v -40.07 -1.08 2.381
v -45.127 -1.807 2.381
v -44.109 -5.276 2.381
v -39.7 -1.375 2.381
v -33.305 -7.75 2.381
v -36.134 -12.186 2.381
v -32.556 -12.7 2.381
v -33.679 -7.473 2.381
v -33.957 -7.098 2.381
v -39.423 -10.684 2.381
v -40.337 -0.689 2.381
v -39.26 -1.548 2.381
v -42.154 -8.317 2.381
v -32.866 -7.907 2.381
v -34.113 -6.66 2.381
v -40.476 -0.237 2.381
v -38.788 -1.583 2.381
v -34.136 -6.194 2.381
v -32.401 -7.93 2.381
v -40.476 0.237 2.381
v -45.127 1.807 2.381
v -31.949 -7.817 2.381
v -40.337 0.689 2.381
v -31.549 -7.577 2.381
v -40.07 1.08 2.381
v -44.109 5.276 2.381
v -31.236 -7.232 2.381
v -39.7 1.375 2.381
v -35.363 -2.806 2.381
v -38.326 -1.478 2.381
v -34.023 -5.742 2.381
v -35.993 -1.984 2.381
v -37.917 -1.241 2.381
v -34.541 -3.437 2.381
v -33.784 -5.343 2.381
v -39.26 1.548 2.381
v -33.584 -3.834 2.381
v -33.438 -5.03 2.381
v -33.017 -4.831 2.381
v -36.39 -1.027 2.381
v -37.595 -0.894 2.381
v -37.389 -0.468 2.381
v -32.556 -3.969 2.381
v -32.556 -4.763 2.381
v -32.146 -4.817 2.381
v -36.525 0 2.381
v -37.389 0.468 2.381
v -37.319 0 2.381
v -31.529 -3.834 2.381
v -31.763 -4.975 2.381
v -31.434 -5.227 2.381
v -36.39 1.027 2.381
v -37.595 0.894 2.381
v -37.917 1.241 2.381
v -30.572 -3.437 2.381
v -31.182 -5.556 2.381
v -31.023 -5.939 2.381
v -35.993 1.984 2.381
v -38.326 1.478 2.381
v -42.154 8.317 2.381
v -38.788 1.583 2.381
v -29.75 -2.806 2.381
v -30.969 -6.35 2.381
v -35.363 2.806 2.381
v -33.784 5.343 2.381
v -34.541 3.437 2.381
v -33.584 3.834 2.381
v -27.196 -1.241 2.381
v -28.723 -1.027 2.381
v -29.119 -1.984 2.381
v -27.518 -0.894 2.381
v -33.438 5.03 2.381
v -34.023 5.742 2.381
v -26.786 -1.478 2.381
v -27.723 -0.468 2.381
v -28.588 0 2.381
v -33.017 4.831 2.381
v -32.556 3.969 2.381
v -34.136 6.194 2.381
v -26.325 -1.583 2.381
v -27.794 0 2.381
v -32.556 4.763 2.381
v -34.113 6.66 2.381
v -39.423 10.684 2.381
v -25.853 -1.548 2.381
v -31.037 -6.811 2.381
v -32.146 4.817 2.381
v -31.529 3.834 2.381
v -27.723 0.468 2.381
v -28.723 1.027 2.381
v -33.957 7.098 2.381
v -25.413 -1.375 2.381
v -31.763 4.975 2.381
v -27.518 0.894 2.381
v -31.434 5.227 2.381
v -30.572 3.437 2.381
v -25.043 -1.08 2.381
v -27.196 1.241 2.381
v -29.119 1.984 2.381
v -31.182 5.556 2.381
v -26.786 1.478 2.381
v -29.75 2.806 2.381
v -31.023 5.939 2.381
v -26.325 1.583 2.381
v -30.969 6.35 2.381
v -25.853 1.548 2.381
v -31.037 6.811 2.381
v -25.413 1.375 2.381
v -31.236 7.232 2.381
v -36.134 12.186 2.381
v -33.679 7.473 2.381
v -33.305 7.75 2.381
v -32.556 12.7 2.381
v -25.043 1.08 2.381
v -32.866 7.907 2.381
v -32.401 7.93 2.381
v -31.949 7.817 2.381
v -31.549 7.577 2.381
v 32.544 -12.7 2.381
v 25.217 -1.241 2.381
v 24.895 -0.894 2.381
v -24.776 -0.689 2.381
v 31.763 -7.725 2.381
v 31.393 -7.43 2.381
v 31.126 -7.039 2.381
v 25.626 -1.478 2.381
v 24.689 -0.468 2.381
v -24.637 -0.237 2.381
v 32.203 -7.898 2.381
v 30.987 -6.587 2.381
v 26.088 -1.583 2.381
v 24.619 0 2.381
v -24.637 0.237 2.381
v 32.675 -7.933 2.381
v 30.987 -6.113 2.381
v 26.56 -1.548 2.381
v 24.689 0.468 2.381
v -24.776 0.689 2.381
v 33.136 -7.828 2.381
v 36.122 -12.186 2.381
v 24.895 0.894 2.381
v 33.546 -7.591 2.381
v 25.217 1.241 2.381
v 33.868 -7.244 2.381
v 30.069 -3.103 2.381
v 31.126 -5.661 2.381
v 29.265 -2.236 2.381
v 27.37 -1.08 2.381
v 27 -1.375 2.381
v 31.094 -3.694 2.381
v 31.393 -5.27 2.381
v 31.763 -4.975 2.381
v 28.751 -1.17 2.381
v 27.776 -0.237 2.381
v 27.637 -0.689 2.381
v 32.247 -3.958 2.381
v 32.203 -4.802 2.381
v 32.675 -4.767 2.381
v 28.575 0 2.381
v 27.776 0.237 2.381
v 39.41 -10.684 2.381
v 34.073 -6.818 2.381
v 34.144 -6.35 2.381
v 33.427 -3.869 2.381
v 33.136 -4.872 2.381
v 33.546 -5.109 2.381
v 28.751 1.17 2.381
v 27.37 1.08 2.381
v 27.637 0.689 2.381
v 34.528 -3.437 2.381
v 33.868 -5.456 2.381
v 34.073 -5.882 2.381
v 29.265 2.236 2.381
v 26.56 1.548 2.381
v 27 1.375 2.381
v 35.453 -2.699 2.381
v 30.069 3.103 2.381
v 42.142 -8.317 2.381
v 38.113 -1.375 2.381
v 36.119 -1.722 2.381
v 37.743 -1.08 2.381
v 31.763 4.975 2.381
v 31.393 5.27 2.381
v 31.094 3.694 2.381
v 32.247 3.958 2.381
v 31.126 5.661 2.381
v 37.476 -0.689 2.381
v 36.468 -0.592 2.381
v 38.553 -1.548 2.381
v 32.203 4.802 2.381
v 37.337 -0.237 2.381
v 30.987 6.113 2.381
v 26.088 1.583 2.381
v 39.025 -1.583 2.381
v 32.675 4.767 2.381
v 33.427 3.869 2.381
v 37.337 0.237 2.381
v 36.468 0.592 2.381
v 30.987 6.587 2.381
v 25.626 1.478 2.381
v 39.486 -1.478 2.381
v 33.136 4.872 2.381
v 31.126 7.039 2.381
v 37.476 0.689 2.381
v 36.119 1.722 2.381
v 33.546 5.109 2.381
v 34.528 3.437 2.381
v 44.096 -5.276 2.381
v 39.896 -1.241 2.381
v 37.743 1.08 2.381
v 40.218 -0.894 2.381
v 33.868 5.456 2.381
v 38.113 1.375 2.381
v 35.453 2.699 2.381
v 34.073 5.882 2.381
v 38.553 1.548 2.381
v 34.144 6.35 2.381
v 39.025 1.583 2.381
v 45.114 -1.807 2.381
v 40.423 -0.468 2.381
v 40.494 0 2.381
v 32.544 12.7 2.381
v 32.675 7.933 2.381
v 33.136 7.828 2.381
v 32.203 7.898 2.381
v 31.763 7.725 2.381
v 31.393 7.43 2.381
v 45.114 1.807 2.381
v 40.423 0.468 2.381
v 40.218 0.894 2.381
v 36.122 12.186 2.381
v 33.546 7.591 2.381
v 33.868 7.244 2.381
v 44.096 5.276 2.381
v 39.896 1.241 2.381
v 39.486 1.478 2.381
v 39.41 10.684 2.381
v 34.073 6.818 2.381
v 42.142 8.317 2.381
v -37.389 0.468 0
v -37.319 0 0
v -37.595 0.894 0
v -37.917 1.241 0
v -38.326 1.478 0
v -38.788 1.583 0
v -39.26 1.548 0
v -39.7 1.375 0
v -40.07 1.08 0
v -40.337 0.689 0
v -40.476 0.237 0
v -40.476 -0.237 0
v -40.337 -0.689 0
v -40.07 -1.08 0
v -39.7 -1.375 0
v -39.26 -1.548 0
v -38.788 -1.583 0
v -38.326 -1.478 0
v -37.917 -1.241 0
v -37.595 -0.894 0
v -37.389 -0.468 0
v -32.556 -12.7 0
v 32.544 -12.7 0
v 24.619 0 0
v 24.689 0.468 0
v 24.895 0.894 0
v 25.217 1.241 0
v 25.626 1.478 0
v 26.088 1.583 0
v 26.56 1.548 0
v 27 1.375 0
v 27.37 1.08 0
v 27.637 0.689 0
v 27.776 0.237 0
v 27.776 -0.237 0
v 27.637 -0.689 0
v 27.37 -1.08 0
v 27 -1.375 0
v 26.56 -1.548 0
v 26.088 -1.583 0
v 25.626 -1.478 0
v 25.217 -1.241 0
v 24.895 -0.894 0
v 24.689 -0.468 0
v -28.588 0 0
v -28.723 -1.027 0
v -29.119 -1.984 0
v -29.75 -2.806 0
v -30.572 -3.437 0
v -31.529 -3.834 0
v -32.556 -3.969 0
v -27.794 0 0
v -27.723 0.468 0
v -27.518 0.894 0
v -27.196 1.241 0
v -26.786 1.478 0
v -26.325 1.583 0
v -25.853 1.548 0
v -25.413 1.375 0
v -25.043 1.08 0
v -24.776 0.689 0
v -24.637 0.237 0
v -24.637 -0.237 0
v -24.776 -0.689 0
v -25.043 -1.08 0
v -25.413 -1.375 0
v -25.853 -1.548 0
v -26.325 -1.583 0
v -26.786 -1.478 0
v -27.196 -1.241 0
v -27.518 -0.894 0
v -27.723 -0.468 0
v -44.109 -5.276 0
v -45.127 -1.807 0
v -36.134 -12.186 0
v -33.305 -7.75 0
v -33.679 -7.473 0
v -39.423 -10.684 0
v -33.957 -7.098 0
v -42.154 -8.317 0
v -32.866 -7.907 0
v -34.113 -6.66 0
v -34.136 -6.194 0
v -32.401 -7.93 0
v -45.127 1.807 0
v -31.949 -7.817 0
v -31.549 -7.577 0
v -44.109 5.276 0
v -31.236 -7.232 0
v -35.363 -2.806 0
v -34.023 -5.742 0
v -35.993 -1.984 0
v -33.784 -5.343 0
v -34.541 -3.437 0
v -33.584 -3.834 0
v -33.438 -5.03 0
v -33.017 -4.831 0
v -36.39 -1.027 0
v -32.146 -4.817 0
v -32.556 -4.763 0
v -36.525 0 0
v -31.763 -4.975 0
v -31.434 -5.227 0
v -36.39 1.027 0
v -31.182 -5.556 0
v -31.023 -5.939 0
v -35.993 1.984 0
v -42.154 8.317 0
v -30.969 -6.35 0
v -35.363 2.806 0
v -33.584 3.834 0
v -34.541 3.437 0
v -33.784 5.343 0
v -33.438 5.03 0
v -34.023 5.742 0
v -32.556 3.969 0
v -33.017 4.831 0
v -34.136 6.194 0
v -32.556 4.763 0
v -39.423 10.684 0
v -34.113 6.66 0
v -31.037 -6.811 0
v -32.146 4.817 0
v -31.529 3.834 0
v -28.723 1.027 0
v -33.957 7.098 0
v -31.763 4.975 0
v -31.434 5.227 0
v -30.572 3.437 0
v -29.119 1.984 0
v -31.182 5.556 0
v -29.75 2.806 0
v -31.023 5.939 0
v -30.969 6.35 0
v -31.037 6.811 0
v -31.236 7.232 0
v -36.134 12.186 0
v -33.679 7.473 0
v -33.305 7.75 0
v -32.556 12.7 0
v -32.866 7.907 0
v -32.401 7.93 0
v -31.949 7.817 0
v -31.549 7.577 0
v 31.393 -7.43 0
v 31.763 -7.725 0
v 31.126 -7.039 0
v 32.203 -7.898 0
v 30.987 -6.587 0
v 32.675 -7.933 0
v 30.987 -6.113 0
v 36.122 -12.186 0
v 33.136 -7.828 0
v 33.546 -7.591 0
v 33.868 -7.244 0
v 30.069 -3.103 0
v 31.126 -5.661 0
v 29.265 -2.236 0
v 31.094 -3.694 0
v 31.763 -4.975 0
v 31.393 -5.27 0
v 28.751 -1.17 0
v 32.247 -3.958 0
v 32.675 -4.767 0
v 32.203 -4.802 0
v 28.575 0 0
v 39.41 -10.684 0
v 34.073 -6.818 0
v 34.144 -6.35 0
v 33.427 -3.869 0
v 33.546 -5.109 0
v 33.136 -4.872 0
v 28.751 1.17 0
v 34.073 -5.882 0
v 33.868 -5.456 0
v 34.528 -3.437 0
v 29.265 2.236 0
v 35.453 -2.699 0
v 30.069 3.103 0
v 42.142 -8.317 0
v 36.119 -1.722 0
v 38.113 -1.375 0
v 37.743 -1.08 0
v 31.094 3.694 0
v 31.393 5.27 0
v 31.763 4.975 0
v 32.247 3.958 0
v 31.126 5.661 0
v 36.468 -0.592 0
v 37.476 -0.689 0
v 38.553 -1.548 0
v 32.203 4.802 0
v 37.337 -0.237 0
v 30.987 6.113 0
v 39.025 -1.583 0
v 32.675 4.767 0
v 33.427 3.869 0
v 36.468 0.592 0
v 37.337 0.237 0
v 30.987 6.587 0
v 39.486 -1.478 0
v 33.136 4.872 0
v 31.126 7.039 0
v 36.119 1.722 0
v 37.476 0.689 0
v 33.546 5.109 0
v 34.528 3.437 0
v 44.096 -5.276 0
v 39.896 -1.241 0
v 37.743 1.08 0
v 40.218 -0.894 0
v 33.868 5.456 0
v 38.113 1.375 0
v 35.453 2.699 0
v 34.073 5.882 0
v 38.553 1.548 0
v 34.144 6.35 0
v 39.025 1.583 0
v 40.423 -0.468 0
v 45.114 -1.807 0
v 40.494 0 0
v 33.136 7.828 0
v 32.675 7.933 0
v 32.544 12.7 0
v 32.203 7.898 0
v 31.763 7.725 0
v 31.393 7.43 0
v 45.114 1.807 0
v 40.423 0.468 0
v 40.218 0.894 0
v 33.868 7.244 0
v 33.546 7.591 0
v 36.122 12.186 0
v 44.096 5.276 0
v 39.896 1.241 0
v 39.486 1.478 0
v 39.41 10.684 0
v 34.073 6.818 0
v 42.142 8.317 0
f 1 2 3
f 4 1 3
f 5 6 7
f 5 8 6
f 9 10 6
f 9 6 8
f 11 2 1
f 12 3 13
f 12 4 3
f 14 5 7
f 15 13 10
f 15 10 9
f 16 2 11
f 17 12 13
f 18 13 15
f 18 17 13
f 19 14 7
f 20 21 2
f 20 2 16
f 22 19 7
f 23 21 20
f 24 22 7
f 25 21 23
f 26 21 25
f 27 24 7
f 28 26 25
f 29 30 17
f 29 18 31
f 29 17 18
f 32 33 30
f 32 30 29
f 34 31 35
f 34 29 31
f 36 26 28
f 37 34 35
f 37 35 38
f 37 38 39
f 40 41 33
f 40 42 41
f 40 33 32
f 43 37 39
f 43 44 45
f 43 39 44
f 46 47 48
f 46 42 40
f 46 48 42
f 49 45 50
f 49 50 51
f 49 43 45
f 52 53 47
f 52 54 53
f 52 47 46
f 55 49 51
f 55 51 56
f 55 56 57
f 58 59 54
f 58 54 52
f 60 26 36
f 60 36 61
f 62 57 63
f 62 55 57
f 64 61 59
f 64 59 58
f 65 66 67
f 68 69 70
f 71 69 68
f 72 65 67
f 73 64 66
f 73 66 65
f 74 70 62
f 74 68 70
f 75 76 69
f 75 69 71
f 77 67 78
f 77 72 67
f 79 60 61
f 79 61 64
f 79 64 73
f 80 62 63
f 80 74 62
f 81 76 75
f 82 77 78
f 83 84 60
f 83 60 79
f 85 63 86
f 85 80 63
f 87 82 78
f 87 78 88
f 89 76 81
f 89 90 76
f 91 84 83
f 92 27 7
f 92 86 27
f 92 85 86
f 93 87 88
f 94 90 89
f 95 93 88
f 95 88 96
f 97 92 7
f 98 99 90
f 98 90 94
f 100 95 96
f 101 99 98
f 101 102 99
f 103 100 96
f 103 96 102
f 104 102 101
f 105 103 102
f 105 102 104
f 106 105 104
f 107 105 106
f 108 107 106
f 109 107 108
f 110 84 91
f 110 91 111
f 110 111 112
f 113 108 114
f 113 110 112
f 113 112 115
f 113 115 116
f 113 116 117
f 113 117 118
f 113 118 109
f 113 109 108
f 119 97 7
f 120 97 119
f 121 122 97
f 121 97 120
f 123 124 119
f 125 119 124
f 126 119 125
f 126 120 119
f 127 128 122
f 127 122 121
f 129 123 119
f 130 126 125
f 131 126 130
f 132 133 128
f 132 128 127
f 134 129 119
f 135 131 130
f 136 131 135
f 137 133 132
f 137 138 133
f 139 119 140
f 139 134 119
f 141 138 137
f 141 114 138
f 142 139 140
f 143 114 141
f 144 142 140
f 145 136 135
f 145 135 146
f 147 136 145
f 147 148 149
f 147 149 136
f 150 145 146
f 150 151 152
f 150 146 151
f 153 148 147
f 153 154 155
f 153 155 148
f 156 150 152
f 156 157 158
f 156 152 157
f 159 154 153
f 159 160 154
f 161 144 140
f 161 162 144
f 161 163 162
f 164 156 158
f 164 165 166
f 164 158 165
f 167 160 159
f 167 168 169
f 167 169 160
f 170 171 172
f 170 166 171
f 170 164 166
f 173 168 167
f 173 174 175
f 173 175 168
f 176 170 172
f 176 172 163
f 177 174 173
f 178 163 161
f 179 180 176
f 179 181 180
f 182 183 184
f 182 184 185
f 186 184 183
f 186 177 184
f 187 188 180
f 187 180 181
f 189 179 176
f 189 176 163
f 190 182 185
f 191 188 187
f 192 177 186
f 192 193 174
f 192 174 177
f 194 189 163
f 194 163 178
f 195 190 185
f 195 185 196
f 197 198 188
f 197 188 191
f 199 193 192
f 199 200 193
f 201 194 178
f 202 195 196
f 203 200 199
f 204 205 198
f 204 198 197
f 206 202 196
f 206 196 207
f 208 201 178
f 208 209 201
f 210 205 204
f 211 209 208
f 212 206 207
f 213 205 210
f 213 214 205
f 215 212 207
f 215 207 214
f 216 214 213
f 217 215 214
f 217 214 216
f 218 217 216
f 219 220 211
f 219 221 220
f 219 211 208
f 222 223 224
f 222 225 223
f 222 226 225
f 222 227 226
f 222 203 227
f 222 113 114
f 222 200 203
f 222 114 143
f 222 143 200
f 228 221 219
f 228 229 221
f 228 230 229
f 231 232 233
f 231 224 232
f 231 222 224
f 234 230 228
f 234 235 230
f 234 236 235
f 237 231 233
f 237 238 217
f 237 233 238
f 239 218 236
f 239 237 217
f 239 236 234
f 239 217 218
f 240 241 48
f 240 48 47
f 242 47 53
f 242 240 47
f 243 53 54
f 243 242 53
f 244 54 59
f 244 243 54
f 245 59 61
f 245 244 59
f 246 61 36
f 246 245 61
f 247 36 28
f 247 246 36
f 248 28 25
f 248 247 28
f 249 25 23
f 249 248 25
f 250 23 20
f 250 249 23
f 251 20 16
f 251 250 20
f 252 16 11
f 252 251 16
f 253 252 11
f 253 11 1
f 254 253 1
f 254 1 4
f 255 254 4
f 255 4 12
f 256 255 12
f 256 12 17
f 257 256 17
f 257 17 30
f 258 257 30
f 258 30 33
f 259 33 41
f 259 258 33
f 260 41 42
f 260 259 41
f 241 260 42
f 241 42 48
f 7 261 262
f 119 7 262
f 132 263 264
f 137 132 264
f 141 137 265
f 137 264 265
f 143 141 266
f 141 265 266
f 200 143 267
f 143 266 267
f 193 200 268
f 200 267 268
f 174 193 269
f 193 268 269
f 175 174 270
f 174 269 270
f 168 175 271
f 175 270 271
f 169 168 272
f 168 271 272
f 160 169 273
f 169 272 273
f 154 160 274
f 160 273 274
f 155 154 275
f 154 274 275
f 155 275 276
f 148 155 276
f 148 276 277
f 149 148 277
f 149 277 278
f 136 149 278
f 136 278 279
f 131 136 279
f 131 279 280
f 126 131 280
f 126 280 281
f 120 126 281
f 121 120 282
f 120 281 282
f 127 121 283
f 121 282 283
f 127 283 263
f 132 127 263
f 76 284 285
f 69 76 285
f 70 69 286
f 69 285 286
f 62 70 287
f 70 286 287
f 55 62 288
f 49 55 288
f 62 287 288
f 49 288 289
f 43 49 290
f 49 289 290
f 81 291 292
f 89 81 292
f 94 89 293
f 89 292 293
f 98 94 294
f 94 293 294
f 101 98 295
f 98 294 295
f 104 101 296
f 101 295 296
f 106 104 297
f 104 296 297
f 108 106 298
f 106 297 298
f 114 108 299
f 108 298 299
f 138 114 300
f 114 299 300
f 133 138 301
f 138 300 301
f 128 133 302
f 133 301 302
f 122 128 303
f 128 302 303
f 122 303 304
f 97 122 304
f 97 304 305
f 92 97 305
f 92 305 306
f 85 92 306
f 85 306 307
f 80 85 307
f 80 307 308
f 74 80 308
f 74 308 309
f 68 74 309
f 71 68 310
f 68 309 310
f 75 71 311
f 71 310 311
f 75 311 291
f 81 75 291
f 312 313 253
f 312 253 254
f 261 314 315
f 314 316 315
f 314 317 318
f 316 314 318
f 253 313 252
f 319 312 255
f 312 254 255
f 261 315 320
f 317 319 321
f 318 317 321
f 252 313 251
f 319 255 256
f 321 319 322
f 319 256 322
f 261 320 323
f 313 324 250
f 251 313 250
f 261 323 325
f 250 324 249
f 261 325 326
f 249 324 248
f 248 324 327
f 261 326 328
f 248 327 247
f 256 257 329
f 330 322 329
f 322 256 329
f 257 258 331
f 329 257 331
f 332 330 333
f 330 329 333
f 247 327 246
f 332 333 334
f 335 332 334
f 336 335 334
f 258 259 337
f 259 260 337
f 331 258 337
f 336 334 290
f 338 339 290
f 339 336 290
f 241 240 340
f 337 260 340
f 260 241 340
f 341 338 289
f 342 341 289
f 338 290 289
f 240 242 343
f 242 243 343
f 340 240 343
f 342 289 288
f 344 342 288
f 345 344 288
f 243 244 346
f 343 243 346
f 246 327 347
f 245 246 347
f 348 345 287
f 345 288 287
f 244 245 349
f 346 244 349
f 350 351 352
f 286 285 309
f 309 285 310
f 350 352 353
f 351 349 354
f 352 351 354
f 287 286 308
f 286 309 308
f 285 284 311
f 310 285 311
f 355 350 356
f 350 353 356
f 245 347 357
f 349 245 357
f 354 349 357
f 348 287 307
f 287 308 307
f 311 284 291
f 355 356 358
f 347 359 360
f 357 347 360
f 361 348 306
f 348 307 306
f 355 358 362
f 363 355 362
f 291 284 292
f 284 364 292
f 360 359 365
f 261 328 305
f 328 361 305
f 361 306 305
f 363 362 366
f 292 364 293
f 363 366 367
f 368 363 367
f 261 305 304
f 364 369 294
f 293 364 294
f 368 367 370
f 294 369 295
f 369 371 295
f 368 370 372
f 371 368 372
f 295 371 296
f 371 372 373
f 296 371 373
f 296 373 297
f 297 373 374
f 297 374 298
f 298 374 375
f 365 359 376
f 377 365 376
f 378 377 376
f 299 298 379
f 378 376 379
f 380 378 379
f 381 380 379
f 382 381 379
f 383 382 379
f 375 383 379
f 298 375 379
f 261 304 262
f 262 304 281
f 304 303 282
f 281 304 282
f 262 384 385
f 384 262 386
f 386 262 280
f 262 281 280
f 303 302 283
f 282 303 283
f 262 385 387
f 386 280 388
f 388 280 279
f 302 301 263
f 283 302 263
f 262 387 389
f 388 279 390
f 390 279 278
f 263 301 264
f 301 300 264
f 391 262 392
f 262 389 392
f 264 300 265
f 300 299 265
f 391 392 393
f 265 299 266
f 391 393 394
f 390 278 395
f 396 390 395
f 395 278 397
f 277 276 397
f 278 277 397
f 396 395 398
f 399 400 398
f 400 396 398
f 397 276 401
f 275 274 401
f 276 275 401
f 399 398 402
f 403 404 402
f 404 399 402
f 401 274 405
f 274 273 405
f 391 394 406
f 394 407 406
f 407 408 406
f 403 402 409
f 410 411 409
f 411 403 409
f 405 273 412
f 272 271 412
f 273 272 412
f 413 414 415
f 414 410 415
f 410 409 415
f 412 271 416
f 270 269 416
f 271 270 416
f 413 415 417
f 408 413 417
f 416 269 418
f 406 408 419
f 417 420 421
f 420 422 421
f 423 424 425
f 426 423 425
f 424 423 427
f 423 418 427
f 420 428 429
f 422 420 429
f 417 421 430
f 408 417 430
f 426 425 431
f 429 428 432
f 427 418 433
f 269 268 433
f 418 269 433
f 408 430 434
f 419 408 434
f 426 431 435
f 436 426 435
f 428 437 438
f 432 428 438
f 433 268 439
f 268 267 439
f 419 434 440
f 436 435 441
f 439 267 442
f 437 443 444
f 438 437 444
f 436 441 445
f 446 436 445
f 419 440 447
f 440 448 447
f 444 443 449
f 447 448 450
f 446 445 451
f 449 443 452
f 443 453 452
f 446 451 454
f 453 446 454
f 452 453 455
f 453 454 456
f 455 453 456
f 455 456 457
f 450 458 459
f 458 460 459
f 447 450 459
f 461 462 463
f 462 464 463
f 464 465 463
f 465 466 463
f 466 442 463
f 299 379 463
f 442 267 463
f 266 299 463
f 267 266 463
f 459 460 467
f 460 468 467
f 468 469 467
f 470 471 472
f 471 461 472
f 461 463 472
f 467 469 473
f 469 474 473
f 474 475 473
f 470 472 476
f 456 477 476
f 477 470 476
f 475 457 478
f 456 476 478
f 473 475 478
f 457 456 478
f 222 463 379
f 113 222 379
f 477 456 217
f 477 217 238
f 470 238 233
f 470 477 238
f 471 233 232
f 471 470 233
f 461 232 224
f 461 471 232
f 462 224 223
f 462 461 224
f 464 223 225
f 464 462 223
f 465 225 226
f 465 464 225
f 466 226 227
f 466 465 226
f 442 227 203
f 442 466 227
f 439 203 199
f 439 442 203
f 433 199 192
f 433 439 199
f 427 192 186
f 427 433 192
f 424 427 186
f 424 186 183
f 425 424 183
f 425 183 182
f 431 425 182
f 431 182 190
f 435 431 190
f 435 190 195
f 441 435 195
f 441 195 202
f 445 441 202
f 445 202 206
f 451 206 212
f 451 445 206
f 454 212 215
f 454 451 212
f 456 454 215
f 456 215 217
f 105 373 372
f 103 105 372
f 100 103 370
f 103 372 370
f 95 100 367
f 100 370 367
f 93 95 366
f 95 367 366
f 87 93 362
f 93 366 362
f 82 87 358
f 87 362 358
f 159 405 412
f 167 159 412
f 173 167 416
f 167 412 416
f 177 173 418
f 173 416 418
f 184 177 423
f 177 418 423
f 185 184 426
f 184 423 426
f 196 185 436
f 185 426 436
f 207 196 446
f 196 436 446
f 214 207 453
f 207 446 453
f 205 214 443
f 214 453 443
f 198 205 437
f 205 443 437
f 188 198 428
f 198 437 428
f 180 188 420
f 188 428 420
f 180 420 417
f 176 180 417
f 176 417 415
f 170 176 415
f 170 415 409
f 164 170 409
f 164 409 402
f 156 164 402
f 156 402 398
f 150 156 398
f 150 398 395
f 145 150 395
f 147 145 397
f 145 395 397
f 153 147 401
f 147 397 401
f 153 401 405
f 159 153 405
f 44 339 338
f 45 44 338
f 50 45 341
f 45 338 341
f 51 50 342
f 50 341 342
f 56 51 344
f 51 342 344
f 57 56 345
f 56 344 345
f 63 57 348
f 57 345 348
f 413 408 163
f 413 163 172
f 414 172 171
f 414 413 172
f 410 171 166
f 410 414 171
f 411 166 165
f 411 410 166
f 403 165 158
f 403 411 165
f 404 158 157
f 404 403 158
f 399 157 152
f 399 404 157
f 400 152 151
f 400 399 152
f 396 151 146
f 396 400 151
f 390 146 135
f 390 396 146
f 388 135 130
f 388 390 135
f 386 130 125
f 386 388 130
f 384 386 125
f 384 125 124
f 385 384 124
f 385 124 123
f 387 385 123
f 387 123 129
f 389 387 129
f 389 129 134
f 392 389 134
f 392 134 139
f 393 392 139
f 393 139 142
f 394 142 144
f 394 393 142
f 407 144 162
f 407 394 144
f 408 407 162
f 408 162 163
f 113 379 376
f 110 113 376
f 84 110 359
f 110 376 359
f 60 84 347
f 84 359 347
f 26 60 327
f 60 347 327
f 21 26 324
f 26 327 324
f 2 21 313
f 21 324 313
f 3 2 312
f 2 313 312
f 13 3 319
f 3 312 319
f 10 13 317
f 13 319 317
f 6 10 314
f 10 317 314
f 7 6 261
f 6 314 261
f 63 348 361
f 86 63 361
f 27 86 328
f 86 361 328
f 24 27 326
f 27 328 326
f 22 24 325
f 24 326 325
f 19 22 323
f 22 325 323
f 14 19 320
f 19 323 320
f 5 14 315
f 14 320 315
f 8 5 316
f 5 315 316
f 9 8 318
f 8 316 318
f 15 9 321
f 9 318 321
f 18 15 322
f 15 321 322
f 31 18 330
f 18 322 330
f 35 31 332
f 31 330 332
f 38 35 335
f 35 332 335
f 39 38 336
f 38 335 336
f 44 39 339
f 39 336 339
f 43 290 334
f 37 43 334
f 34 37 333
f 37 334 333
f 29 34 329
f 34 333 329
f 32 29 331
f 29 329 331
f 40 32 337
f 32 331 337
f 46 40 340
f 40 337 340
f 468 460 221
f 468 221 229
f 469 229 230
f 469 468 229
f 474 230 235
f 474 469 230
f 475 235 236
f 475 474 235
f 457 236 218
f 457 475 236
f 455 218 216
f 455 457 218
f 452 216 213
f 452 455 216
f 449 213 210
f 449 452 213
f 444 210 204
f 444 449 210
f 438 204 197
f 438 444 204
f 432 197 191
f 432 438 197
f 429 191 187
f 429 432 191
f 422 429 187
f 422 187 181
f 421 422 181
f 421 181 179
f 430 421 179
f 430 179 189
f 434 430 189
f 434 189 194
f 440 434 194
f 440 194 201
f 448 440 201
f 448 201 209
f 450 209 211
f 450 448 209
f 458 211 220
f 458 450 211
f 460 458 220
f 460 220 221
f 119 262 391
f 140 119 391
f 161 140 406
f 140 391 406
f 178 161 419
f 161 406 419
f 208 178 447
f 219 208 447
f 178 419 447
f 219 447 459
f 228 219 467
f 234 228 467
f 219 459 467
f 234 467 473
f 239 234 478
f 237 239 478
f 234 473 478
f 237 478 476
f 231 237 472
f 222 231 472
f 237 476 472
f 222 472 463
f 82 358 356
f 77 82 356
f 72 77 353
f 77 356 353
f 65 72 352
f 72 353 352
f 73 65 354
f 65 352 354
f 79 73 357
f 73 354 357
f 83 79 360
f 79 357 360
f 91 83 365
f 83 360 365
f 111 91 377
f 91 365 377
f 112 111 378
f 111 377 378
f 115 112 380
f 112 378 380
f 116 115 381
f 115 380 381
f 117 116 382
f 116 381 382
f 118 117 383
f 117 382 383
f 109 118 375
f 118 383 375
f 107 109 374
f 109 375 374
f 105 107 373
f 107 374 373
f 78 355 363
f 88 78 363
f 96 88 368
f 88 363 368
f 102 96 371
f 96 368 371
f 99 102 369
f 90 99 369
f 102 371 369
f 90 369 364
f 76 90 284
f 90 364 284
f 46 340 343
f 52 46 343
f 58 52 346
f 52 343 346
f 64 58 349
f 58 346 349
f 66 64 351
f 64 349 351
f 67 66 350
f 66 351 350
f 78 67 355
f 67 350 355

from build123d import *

# Parameters (mm, degrees)
F0_R     = 1.5875
F1_DEPTH = 2.38125


# Not quite as in the source:
# - a length typed as a fraction of an inch, garbled in the dataset ("3 / 203.2 mm" for 3/8 in), is restored


with BuildPart() as f1:
    # F0 (on Top) → F1 (new body)
    with BuildSketch(Plane.XY):
        with BuildLine():
            Line((0, -12.7), (0, 0))
            Line((0, 0), (0, 12.7))
            Line((0, 12.7), (-32.55645, 12.7))
            ThreePointArc((-32.55645, 12.7), (-45.25645, 0), (-32.55645, -12.7))
            Line((-32.55645, -12.7), (0, -12.7))
        make_face()
        with BuildLine():
            ThreePointArc((-30.96895, -6.35), (-33.6789820151, -7.4725320151), (-32.55645, -4.7625))
            ThreePointArc((-32.55645, -4.7625), (-31.4339179849, -5.2274679849), (-30.96895, -6.35))
        make_face(mode=Mode.SUBTRACT)
        with Locations((-38.90645, 0)):
            Circle(F0_R, mode=Mode.SUBTRACT)
        with BuildLine():
            ThreePointArc((-32.55645, 3.96875), (-29.7501199622, 2.8063300378), (-28.5877, 0))
            ThreePointArc((-28.5877, 0), (-29.7501199622, -2.8063300378), (-32.55645, -3.96875))
            ThreePointArc((-32.55645, -3.96875), (-35.3627800378, -2.8063300378), (-36.5252, 0))
            ThreePointArc((-36.5252, 0), (-35.3627800378, 2.8063300378), (-32.55645, 3.96875))
        make_face(mode=Mode.SUBTRACT)
        with BuildLine():
            ThreePointArc((-24.61895, 0), (-26.20645, -1.5875), (-27.79395, 0))
            ThreePointArc((-27.79395, 0), (-26.20645, 1.5875), (-24.61895, 0))
        make_face(mode=Mode.SUBTRACT)
        with BuildLine():
            ThreePointArc((-30.96895, 6.35), (-31.4339179849, 5.2274679849), (-32.55645, 4.7625))
            ThreePointArc((-32.55645, 4.7625), (-33.6789820151, 7.4725320151), (-30.96895, 6.35))
        make_face(mode=Mode.SUBTRACT)
        with BuildLine():
            Line((0, 12.7), (0, 0))
            Line((0, 0), (0, -12.7))
            Line((0, -12.7), (32.54375, -12.7))
            ThreePointArc((32.54375, -12.7), (45.24375, 0), (32.54375, 12.7))
            Line((32.54375, 12.7), (0, 12.7))
        make_face()
        with Locations((32.55645, -6.35)):
            Circle(F0_R, mode=Mode.SUBTRACT)
        with BuildLine():
            ThreePointArc((27.79395, 0), (26.20645, -1.5875), (24.61895, 0))
            ThreePointArc((24.61895, 0), (26.20645, 1.5875), (27.79395, 0))
        make_face(mode=Mode.SUBTRACT)
        with BuildLine():
            ThreePointArc((36.5125, 0), (32.54375, -3.96875), (28.575, 0))
            ThreePointArc((28.575, 0), (32.54375, 3.96875), (36.5125, 0))
        make_face(mode=Mode.SUBTRACT)
        with Locations((38.90645, 0)):
            Circle(F0_R, mode=Mode.SUBTRACT)
        with Locations((32.55645, 6.35)):
            Circle(F0_R, mode=Mode.SUBTRACT)
    extrude(amount=F1_DEPTH)


solid = f1.part
